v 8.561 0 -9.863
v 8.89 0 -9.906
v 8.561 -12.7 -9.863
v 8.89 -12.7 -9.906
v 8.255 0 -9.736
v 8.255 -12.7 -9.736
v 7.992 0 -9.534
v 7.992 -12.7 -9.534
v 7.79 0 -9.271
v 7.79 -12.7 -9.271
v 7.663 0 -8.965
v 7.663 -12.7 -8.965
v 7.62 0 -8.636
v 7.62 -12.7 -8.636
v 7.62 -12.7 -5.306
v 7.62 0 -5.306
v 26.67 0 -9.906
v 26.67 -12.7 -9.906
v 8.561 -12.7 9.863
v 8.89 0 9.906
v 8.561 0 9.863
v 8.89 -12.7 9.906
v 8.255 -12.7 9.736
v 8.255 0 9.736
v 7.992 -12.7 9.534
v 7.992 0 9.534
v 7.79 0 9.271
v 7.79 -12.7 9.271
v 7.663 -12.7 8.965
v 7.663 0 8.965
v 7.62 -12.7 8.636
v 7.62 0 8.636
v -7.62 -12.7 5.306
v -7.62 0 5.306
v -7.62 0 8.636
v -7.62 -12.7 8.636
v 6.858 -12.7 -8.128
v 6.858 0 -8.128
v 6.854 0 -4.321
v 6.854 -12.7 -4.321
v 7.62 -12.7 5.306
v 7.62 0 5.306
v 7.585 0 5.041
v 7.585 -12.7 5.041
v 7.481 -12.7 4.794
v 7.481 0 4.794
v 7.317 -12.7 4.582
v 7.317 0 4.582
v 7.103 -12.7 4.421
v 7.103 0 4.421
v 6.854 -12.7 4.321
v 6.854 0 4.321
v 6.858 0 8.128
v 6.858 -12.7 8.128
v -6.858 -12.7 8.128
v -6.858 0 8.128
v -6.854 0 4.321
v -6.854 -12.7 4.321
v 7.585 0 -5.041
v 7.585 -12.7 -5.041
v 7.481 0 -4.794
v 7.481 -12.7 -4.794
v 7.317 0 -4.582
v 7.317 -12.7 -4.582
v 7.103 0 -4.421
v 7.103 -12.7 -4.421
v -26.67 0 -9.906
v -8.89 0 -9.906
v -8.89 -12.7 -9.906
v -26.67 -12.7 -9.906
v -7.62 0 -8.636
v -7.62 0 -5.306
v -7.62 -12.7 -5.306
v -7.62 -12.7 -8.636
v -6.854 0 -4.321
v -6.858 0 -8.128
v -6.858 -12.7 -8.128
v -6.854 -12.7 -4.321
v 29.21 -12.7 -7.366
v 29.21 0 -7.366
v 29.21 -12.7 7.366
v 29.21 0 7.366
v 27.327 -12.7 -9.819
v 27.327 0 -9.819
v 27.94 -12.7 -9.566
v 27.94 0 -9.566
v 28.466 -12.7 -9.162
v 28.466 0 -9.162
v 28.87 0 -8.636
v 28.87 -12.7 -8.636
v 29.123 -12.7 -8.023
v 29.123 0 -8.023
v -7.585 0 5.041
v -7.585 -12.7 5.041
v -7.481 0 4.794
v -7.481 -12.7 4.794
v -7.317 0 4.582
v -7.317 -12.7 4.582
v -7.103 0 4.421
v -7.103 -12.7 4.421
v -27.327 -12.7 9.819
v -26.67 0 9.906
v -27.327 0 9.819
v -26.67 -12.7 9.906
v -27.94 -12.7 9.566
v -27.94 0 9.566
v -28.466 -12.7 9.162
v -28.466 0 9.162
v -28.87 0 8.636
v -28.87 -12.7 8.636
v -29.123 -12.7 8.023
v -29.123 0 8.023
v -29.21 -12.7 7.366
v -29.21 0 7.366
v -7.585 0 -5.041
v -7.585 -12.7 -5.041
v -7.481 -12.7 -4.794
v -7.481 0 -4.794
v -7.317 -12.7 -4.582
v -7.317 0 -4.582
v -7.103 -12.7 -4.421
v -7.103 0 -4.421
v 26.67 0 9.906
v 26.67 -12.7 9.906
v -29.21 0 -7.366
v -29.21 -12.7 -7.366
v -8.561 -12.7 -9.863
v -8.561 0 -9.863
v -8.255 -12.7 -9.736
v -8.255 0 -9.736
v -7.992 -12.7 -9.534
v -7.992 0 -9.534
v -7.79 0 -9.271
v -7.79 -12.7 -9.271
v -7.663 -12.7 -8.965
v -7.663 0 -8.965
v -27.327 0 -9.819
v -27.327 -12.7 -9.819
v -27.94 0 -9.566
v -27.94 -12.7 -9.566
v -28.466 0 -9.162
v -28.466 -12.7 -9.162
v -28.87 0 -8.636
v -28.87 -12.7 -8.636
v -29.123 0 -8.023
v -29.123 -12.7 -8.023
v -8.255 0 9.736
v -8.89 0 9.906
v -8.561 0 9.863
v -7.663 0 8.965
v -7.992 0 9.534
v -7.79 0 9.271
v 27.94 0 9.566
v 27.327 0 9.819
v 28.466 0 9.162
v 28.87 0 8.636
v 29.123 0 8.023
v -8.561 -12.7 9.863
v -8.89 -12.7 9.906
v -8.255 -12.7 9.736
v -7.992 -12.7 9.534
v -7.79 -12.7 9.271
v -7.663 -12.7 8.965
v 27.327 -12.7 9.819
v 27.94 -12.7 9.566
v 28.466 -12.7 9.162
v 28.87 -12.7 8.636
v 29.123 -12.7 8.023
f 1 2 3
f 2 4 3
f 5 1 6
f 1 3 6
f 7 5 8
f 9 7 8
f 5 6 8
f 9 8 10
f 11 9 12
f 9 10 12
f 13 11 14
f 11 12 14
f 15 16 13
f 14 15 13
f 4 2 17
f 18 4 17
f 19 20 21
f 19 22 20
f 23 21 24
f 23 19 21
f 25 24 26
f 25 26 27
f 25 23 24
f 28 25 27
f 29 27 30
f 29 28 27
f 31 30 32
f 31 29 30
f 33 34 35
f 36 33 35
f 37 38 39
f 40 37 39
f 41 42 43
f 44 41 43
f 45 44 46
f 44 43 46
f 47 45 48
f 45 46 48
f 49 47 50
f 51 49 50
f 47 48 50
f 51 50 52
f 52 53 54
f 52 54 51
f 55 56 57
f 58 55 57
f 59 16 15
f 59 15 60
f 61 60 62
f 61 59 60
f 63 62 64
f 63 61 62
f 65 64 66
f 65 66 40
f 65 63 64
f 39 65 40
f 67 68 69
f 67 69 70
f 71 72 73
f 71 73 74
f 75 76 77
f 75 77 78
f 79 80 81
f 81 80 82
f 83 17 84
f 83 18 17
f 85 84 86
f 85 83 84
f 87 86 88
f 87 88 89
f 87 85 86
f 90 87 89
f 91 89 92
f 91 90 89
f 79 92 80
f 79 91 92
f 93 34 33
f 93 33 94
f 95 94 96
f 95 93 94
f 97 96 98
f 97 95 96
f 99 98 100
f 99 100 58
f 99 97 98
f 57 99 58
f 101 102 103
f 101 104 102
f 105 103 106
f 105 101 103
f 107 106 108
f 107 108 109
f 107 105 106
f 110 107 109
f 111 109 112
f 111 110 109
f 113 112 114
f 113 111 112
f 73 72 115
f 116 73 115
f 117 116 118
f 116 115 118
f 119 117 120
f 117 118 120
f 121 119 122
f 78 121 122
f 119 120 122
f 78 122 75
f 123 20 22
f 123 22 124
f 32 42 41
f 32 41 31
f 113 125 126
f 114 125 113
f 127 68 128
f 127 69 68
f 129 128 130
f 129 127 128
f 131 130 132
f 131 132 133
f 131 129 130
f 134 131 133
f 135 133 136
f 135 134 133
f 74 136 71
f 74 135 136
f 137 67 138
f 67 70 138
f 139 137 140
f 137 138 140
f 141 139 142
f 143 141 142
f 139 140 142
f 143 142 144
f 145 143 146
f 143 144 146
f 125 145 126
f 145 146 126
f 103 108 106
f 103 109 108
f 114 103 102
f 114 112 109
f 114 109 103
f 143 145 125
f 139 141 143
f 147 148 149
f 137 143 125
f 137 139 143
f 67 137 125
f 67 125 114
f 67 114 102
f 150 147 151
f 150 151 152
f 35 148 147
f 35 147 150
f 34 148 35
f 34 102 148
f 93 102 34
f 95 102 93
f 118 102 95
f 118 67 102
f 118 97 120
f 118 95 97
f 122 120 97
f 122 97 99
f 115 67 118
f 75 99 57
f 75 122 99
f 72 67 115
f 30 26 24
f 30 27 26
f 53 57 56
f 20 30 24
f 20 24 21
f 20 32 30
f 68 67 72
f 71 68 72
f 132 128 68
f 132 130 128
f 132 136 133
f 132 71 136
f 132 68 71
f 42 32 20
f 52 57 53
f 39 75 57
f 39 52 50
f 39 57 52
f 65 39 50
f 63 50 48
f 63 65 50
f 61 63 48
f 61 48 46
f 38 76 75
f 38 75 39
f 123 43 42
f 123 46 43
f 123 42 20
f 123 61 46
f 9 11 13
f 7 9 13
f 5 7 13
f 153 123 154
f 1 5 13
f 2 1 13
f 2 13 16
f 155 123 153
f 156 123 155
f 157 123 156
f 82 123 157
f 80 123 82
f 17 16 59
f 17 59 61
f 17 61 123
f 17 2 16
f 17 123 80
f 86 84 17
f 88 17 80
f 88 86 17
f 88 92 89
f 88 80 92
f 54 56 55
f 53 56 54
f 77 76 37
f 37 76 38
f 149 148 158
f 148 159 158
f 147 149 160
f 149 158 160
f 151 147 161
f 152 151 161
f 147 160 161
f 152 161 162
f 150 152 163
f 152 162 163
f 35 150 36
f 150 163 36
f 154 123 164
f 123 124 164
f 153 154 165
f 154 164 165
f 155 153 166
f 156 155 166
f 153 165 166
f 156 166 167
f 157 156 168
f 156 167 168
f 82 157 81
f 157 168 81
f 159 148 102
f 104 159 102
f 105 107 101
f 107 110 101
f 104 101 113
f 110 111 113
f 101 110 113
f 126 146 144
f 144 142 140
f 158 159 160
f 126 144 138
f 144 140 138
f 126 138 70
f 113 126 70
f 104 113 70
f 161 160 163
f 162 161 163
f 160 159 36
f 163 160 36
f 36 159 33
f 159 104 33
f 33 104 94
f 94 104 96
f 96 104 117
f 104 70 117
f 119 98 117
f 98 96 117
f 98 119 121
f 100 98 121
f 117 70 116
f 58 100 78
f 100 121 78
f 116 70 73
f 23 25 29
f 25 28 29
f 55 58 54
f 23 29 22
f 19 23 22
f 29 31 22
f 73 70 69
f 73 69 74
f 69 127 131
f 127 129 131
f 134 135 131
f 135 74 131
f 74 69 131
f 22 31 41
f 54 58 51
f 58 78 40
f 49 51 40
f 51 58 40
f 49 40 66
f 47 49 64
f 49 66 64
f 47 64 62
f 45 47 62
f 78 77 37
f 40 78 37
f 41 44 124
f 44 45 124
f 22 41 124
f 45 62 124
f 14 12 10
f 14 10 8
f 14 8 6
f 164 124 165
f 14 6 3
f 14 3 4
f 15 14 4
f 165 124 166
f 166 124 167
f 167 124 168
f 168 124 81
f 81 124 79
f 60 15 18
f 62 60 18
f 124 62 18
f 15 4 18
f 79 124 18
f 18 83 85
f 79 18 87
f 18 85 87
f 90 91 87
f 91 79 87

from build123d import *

# Parameters (mm, degrees)
F1_DEPTH    = 12.7
F2_R        = 2.54
F3_R        = 1.27
F4_T1_DEPTH = 12.7


# Not quite as in the source:
# - a fillet or chamfer that OpenCascade refuses, or shapes differently, is made with other operations: its cross-section is extruded or revolved along the edge and cut away or added


with BuildPart() as f1:
    # F0 (on Front) → F1 (new body)
    with BuildSketch(Plane.XZ):
        Polygon((-29.21, 0), (0, 0), (0, 8.128), (-6.858, 8.128), (-6.8540549837, 4.3214331381), (-7.62, 4.3214331381), (-7.62, 9.906), (-29.21, 9.906), align=None)
    extrude(amount=F1_DEPTH)

    # F2
    f2_edges = [f1.edges().sort_by_distance(p)[0] for p in [
        (-29.21, -6.35, 9.906),
    ]]
    fillet(f2_edges, radius=F2_R)

    # F3
    f3_edges = [f1.edges().sort_by_distance(p)[0] for p in [
        (-7.62, -6.35, 9.906),
    ]]
    fillet(f3_edges, radius=F3_R)

    # F4: fillet of radius 1.016 on 1 edges, made by hand

    # F4_s2 → F4_t1 (join)
    with BuildSketch(Plane.XZ):
        with BuildLine():
            ThreePointArc((-7.62, 5.306181078), (-7.4059700317, 4.6824022163), (-6.8540549837, 4.3214331381))
            Line((-6.8540549837, 4.3214331381), (-7.62, 4.3214331381))
            Line((-7.62, 4.3214331381), (-7.62, 5.306181078))
        make_face()
    extrude(amount=F4_T1_DEPTH)

    # F5: F1 across face


with BuildPart() as f1_1:
    add(f1.part)
    add(f1.part.mirror(Plane(origin=(-14.605, -6.35, 0), x_dir=(1, 0, 0), z_dir=(0, 0, -1))))

    # F6: F1 across face


with BuildPart() as f1_2:
    add(f1_1.part)
    add(f1_1.part.mirror(Plane(origin=(0, -6.35, 0), x_dir=(0, 1, 0), z_dir=(1, 0, 0))))


solid = f1_2.part
